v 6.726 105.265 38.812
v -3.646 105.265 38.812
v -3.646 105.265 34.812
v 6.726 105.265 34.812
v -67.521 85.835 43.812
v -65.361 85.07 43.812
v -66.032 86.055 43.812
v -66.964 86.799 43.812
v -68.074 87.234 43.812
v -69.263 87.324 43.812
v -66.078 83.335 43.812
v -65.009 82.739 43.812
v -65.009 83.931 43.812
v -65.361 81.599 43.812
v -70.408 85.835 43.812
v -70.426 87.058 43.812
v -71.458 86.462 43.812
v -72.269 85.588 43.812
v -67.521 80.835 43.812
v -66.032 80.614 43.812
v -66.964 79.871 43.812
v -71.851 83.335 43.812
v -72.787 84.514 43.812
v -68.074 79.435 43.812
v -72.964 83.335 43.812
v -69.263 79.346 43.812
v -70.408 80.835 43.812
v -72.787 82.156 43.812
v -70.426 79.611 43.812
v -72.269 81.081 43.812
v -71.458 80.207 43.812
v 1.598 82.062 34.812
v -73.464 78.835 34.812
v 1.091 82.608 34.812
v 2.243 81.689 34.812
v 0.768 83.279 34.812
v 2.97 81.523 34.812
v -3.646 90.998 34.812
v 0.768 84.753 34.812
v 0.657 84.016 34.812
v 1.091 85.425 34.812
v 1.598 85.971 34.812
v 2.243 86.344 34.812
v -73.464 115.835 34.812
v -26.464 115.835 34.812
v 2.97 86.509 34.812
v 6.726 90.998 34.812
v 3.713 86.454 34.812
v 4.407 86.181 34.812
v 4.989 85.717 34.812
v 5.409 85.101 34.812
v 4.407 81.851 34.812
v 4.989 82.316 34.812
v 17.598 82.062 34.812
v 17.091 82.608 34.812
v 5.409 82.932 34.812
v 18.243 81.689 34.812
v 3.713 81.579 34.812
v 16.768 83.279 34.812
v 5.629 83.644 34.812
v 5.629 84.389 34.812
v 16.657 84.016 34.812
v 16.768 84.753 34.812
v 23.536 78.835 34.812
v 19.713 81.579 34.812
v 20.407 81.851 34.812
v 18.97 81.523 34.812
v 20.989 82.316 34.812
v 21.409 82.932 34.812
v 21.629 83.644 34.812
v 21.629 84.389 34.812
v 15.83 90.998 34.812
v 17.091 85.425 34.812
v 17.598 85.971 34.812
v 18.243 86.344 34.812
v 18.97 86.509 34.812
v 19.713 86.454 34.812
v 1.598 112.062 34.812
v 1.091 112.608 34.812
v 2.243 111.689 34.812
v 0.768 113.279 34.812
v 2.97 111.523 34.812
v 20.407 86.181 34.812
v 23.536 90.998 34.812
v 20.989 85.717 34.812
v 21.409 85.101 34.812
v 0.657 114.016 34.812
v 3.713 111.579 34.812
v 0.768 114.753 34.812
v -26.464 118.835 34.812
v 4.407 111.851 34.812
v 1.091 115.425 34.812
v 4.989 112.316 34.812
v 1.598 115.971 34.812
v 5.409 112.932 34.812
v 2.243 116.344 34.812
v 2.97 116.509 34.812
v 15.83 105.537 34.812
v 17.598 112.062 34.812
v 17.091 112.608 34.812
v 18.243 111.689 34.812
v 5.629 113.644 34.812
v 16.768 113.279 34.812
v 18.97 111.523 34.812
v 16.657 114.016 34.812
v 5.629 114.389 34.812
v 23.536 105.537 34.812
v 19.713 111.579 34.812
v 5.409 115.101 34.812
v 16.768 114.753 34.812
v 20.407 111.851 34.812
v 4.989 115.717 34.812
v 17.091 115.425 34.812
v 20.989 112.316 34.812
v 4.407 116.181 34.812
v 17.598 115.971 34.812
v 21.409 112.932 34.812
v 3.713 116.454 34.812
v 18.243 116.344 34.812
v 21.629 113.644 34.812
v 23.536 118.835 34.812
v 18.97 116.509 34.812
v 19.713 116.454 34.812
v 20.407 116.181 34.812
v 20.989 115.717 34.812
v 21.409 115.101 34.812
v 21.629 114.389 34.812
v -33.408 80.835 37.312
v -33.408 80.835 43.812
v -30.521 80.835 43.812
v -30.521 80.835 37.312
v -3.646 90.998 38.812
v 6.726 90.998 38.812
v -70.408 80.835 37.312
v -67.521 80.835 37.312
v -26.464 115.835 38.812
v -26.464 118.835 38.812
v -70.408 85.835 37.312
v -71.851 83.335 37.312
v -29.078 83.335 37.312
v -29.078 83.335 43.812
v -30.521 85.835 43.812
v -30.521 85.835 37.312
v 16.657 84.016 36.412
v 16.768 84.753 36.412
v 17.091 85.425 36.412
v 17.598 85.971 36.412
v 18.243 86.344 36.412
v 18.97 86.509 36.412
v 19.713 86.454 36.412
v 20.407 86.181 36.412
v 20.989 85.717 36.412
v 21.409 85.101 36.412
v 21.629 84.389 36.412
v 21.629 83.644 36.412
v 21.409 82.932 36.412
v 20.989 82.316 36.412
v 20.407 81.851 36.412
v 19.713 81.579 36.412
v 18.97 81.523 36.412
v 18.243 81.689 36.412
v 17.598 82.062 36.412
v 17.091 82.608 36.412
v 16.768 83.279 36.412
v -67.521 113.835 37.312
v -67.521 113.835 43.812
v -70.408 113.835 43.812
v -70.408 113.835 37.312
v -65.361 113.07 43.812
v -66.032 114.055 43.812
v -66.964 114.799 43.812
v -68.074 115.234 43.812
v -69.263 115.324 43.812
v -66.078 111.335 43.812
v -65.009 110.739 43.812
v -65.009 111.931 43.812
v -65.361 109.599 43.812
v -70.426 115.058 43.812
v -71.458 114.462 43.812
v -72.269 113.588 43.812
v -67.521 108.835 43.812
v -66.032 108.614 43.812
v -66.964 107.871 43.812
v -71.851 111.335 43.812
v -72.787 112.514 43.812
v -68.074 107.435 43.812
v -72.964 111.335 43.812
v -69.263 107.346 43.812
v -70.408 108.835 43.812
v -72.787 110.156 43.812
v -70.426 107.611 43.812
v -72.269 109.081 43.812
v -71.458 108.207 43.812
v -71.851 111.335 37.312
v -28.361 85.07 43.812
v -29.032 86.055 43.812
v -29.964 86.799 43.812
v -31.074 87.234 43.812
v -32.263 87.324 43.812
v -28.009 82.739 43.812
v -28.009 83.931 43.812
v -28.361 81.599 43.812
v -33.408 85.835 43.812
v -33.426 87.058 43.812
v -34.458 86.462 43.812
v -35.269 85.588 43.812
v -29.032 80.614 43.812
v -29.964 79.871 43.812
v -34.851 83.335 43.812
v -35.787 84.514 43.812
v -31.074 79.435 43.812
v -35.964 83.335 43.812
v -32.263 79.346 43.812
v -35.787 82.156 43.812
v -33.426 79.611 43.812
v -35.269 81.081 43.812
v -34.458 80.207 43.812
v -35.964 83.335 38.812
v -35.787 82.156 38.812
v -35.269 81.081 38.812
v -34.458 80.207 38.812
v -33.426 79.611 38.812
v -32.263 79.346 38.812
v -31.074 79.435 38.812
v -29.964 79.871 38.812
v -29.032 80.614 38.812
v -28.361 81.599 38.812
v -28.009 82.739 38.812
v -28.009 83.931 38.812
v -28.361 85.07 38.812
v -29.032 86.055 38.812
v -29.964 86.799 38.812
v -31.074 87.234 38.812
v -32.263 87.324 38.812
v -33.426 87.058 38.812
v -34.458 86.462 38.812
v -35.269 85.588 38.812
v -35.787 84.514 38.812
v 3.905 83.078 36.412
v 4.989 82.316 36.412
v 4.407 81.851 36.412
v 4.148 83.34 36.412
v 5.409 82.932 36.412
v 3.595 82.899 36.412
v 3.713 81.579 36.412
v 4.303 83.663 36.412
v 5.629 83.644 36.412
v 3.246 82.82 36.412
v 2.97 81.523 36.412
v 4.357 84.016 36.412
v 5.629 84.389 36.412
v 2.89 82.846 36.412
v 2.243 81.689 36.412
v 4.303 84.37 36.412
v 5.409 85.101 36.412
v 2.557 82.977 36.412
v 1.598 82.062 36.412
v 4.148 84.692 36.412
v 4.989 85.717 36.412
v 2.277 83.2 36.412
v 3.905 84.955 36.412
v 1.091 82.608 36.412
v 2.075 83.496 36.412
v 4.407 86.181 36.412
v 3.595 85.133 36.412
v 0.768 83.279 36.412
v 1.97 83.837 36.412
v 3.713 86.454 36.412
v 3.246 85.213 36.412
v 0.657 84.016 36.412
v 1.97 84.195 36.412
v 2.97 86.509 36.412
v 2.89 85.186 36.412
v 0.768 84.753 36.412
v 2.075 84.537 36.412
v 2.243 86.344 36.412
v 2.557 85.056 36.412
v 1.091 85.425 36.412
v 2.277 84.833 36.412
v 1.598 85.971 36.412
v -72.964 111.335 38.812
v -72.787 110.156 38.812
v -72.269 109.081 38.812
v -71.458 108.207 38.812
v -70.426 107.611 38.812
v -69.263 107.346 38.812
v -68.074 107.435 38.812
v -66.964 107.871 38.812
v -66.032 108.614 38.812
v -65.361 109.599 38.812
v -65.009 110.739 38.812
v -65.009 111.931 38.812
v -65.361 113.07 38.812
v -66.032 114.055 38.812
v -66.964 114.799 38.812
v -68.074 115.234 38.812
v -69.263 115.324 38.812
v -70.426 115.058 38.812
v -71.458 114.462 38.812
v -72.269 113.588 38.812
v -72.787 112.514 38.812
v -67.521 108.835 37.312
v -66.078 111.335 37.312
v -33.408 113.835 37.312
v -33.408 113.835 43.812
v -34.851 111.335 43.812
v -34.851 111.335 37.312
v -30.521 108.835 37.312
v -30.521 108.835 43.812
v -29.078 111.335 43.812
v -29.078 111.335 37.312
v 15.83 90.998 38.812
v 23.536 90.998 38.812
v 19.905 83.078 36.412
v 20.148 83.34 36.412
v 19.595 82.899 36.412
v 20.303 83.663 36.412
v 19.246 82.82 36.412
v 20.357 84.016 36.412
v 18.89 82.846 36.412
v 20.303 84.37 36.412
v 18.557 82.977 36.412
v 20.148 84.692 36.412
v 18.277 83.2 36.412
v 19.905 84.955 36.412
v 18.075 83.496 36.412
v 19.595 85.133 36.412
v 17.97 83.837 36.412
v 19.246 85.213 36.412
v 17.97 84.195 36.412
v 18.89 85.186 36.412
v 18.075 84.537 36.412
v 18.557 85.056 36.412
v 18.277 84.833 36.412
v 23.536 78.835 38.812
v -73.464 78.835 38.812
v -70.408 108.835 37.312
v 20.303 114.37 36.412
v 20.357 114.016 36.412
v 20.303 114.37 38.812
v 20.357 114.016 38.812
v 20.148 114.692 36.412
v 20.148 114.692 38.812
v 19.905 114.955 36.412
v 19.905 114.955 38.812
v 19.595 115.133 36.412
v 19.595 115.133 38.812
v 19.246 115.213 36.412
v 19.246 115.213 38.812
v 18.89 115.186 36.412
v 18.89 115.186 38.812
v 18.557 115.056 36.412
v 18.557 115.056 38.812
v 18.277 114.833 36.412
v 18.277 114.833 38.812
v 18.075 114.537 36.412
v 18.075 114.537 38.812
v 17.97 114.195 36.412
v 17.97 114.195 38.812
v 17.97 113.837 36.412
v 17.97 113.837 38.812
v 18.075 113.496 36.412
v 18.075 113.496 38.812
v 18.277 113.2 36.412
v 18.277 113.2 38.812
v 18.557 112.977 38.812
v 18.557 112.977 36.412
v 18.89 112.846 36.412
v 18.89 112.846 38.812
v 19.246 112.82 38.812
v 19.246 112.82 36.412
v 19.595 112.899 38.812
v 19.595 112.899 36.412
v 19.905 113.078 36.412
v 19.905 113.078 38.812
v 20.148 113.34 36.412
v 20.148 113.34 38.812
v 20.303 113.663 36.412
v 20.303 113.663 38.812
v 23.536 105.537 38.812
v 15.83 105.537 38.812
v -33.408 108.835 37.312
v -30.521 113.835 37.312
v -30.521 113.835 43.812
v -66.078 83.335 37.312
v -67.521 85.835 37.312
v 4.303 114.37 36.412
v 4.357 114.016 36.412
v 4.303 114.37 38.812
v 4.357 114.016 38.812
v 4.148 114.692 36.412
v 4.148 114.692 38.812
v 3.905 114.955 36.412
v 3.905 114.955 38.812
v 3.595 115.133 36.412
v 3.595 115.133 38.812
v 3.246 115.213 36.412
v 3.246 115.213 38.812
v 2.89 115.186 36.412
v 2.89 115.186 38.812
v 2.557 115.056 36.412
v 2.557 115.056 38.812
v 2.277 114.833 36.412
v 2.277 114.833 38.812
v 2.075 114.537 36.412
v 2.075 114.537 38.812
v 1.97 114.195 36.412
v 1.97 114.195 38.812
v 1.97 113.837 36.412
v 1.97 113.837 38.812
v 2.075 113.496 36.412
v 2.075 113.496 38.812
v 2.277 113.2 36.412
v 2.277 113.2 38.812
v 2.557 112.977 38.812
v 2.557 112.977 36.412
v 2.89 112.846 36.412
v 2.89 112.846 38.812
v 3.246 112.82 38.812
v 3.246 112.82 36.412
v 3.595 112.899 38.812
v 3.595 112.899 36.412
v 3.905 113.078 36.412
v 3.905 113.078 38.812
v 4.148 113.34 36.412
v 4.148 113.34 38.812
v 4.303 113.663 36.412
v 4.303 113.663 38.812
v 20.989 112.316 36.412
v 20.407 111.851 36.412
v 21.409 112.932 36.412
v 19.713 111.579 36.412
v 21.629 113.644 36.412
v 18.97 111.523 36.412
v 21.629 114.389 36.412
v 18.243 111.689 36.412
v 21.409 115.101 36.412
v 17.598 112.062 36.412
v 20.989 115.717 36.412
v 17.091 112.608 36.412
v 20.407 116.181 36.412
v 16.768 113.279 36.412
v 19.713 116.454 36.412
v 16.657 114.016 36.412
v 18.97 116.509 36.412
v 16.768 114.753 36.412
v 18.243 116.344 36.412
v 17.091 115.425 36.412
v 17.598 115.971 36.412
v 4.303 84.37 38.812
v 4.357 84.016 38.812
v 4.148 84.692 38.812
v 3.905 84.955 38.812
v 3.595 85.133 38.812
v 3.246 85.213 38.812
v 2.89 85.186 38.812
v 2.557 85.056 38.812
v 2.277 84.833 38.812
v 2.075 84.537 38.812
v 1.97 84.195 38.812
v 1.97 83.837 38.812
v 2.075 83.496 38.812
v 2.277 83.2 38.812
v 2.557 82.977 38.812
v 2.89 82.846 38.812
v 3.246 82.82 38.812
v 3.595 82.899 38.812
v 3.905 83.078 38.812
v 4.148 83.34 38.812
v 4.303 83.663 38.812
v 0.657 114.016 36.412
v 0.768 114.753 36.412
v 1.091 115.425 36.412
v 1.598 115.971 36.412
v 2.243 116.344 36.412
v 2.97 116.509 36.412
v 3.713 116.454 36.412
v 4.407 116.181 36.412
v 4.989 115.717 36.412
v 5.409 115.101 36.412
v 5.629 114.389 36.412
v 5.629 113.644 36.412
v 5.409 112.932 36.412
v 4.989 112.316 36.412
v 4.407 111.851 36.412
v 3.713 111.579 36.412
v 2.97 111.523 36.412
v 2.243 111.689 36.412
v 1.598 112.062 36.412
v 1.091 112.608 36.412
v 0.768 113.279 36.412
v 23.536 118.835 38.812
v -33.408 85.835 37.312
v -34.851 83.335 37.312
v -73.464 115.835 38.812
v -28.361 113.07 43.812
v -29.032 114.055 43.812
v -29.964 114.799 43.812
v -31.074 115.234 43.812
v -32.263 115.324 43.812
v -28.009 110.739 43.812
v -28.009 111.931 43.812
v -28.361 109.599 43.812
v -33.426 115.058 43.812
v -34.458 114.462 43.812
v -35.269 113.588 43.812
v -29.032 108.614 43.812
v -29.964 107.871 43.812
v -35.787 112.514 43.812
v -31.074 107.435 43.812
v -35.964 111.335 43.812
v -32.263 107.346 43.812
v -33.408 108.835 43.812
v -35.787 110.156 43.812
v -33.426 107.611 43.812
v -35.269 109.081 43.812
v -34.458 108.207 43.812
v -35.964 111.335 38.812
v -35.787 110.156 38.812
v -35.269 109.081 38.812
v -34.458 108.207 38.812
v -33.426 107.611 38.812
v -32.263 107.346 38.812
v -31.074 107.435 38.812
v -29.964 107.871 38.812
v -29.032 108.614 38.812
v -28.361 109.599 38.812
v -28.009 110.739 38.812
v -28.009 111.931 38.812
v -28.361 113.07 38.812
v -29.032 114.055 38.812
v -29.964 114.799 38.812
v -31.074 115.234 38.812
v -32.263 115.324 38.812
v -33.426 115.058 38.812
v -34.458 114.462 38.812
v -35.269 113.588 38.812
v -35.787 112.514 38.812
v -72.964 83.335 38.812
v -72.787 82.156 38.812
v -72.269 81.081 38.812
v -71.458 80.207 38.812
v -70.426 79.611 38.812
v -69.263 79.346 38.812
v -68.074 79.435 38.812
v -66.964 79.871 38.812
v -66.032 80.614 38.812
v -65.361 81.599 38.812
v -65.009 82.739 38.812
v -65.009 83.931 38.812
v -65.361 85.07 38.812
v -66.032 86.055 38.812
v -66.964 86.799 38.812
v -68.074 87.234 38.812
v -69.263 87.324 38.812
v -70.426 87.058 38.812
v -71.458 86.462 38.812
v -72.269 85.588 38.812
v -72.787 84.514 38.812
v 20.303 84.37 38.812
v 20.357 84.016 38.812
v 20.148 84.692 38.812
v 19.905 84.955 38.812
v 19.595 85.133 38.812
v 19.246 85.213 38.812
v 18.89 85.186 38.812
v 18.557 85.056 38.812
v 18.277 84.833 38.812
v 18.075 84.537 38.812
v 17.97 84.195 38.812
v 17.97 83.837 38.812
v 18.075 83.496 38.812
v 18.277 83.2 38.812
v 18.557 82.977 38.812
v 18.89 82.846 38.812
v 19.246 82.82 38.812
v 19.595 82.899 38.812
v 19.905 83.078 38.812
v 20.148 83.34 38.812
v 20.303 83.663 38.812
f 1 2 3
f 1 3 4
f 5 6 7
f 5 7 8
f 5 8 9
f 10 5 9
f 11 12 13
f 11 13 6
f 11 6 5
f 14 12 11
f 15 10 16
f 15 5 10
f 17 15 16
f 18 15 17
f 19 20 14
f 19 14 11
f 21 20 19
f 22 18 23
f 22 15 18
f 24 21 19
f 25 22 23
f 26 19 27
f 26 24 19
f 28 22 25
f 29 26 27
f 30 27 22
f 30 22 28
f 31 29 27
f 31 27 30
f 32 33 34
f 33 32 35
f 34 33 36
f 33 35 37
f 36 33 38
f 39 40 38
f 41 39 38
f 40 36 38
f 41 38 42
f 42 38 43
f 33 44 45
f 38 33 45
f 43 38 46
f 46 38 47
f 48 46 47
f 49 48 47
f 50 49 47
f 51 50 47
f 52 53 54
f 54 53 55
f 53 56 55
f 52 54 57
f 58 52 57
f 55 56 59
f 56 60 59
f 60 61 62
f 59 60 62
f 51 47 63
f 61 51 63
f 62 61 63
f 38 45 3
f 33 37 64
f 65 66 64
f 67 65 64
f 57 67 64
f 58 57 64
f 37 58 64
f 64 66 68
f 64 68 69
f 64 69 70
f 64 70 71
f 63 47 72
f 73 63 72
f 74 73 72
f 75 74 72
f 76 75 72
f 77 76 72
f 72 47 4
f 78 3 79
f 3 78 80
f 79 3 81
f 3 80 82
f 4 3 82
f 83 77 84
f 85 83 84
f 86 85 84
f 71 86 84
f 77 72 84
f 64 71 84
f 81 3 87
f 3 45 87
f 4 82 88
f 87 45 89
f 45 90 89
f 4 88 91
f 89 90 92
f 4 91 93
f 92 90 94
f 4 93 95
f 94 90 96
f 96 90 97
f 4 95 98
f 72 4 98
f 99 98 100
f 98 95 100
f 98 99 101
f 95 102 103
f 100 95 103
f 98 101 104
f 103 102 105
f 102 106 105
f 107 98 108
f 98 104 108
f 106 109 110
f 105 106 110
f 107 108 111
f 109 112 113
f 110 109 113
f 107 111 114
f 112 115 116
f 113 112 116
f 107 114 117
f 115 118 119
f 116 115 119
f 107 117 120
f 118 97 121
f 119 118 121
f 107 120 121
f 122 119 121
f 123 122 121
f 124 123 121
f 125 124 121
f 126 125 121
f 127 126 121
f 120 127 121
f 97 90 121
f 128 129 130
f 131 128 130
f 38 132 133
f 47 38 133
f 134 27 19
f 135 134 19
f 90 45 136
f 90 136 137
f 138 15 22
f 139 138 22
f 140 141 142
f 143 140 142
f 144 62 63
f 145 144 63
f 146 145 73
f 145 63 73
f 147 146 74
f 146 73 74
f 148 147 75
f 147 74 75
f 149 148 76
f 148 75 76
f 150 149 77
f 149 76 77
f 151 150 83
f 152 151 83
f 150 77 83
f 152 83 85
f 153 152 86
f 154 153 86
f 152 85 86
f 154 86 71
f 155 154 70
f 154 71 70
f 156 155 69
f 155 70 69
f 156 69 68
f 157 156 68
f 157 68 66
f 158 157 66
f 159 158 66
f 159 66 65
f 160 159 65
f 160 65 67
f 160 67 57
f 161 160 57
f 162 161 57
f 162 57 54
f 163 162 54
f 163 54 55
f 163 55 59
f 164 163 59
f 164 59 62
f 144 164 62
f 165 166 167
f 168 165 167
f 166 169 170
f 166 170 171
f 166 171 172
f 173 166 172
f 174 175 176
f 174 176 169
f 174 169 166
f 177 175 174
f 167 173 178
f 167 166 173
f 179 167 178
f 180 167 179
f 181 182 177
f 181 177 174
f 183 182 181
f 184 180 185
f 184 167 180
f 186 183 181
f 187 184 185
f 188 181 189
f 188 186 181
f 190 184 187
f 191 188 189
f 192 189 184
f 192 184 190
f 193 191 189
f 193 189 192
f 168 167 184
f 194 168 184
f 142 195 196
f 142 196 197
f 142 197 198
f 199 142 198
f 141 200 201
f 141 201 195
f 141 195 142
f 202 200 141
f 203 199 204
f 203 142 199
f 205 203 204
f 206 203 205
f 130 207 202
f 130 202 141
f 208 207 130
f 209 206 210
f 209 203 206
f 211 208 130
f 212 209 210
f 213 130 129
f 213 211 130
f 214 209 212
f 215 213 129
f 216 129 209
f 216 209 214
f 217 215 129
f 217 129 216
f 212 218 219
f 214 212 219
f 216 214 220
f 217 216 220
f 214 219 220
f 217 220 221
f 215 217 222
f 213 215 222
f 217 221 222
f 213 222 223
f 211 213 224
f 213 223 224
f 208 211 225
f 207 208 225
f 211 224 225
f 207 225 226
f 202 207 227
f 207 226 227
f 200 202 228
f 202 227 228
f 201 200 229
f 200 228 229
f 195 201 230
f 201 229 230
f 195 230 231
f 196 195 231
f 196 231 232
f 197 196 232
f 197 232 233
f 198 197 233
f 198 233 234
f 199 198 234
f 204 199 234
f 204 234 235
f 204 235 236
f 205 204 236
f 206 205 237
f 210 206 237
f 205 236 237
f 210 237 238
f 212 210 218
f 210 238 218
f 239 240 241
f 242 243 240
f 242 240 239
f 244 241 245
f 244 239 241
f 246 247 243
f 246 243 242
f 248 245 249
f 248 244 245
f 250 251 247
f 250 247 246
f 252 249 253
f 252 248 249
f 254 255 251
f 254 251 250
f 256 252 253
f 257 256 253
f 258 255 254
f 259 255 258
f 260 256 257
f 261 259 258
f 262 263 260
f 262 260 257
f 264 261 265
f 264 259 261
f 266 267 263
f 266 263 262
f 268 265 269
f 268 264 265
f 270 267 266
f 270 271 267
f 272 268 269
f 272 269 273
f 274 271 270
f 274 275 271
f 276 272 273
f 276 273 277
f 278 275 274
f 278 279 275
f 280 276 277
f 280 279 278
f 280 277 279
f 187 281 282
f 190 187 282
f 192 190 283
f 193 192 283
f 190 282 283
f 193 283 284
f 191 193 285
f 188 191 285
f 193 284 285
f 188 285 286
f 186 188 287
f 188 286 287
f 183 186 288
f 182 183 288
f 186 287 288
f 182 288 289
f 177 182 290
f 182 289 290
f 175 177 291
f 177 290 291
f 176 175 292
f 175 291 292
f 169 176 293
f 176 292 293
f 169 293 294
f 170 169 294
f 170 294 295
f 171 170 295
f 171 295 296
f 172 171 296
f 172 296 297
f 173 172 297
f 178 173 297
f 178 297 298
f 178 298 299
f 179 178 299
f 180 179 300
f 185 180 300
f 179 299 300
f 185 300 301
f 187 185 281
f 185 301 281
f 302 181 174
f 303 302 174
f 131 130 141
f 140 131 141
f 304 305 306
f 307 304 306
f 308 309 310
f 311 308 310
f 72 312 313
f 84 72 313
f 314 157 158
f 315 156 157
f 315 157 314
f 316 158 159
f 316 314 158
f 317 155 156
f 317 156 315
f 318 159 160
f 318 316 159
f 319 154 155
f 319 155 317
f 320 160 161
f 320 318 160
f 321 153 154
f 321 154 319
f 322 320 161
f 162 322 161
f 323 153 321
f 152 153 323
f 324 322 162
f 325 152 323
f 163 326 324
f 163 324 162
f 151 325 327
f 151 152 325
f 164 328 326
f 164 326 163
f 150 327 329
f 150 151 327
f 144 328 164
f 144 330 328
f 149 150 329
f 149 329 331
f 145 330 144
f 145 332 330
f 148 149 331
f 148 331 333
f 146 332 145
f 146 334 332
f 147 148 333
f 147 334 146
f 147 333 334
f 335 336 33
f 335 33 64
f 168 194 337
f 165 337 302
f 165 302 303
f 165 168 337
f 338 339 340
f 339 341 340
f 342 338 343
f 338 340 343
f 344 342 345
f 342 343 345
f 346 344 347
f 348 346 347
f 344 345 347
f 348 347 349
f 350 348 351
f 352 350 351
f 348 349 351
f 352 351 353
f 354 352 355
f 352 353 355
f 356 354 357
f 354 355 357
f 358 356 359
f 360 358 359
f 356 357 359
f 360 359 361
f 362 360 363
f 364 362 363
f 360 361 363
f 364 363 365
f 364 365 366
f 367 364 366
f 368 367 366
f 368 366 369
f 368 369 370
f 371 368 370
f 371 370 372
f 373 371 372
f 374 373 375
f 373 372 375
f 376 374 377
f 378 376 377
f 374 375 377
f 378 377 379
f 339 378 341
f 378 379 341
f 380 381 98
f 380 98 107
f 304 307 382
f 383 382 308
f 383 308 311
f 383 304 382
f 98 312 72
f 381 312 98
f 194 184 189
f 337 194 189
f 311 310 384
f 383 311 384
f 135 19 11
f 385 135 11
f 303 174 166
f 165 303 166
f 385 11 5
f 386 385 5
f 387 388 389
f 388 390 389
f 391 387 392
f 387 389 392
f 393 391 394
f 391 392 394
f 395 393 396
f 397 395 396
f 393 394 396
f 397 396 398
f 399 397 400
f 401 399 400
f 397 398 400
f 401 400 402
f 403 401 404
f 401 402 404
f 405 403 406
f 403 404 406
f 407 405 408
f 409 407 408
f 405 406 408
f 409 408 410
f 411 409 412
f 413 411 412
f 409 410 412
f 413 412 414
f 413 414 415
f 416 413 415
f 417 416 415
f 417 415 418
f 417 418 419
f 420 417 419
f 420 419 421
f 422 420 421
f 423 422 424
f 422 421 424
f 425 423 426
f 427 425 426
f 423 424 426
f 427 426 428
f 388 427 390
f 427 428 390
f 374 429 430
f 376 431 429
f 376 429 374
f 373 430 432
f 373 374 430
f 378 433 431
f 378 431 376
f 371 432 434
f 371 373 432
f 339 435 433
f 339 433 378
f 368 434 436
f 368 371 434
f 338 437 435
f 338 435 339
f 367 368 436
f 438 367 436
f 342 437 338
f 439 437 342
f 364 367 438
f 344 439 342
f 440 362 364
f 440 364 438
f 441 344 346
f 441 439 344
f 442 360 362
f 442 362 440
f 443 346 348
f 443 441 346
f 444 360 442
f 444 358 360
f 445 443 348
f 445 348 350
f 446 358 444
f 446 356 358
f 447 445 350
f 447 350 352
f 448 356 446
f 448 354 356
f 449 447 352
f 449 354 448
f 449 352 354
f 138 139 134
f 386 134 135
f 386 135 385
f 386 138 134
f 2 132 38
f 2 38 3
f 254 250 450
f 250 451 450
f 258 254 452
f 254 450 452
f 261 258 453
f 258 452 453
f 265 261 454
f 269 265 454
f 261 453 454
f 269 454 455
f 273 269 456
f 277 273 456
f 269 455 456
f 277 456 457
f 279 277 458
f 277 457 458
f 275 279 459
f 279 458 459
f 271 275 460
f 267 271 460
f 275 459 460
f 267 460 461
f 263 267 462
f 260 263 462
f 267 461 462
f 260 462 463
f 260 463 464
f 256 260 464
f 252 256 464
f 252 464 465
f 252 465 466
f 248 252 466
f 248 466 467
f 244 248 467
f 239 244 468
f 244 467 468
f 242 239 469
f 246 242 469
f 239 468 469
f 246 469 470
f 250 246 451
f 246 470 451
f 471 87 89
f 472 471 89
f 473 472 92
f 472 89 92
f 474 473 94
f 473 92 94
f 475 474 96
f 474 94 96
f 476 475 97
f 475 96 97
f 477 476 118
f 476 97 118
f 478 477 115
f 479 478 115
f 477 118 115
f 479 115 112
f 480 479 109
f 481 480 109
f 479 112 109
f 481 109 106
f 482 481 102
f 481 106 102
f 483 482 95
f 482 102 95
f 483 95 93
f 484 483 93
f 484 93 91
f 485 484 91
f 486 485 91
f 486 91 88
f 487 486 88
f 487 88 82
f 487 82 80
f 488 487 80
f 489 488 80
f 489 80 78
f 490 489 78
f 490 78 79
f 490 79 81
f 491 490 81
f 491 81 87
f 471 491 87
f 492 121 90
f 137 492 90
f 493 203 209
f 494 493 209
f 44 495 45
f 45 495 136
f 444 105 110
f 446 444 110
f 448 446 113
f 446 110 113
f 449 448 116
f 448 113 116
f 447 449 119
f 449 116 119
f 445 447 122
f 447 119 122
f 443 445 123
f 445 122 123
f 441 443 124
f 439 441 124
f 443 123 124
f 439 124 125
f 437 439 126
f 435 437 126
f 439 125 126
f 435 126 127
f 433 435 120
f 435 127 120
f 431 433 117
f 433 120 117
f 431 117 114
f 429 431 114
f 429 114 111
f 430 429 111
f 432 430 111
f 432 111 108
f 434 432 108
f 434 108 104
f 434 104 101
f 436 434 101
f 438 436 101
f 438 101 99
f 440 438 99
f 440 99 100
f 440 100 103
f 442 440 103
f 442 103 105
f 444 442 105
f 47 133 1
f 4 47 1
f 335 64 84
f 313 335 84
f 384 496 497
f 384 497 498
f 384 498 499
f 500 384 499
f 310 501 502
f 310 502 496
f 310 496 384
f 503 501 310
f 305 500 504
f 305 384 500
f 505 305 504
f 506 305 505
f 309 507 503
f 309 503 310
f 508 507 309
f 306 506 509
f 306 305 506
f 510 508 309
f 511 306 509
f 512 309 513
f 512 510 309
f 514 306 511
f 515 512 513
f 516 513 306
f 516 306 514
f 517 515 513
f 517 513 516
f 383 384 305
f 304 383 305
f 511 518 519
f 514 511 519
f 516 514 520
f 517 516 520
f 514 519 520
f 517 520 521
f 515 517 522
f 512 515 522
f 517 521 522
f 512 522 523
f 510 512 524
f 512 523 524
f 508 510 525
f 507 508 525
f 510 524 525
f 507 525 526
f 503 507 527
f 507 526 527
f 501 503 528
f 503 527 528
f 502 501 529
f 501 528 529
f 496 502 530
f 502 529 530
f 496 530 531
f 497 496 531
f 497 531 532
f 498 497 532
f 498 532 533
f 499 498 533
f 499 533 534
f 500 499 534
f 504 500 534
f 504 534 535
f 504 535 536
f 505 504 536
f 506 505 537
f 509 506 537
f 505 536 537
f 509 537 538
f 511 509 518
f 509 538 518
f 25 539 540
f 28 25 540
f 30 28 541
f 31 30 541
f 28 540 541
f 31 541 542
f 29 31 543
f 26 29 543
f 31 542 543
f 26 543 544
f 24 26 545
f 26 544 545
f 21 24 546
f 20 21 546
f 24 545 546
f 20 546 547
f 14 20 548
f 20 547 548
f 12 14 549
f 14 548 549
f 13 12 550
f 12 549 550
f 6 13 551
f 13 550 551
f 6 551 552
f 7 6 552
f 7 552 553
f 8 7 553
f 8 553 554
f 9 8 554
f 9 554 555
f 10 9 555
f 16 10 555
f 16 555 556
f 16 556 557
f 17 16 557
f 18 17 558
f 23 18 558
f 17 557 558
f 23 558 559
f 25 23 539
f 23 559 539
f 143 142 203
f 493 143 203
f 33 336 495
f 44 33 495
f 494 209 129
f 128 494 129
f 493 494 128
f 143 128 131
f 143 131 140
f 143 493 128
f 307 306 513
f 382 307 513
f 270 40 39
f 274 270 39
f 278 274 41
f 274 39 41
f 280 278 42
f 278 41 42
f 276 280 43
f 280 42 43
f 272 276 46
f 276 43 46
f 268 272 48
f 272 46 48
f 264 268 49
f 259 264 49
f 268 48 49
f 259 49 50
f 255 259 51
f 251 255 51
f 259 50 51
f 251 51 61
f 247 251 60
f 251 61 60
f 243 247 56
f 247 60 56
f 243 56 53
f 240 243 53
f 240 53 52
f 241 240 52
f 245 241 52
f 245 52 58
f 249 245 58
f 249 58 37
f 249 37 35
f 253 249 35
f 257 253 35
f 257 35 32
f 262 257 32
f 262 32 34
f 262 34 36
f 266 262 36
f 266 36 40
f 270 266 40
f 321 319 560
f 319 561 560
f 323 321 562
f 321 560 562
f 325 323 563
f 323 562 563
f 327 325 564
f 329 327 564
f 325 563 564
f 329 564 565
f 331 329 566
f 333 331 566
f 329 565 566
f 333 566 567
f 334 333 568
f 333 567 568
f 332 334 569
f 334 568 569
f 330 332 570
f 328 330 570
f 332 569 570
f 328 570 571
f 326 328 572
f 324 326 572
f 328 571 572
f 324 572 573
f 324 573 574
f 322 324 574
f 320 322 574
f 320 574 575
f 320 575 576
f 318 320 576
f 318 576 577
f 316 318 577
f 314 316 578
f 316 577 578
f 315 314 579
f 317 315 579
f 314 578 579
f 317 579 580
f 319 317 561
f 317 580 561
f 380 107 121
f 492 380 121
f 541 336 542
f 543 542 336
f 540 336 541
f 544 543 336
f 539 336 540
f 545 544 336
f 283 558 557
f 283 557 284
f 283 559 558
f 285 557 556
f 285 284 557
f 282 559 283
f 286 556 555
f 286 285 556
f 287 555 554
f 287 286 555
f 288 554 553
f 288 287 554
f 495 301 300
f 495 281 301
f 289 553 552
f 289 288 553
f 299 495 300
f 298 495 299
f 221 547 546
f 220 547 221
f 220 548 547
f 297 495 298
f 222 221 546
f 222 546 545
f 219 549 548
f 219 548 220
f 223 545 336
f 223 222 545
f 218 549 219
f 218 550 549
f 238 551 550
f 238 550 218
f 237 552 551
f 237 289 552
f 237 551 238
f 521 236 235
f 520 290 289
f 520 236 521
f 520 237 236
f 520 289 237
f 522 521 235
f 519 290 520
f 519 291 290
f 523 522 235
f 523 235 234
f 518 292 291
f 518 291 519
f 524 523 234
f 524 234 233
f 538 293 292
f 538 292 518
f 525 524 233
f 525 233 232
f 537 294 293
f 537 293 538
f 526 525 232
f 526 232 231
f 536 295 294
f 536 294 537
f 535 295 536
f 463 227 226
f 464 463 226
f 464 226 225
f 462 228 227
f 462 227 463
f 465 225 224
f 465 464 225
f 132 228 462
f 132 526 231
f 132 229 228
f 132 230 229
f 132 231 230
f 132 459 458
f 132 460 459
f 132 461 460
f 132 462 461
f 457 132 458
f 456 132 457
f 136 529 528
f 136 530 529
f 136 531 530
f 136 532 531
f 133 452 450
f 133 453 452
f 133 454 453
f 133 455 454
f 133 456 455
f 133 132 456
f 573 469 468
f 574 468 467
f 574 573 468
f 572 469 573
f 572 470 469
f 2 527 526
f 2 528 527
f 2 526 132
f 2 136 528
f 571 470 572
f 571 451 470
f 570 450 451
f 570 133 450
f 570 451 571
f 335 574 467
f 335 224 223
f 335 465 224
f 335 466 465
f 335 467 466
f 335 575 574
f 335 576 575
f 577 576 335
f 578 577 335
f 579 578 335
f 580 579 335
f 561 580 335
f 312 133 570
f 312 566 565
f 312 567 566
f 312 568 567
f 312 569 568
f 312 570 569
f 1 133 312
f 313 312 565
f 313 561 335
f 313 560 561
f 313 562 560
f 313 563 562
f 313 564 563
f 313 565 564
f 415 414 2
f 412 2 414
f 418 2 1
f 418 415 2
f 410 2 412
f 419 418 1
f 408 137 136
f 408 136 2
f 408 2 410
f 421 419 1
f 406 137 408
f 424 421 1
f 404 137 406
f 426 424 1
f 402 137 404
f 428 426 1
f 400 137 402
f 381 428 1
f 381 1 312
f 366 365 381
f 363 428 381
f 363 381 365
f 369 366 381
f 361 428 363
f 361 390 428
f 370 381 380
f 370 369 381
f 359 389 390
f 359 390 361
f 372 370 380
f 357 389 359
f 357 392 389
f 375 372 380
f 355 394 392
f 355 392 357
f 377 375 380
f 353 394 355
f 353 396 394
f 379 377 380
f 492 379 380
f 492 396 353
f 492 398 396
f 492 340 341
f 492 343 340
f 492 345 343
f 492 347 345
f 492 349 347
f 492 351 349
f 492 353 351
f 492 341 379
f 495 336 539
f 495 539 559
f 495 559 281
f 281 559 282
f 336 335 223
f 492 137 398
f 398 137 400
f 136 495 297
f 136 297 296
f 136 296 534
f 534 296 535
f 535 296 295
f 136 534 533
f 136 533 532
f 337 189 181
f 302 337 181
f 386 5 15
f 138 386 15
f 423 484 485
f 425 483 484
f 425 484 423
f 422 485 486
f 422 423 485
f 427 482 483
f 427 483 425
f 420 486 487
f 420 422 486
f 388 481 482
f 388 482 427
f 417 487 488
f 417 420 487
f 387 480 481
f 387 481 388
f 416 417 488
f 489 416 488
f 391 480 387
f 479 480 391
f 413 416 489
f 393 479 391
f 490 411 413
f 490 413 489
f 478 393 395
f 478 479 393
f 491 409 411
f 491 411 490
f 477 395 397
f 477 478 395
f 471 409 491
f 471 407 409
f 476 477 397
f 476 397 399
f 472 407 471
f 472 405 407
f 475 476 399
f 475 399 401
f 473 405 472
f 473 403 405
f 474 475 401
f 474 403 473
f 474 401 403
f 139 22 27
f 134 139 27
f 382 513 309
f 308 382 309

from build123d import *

# Parameters (mm, degrees)
SKETCH1_W                                        = 50
SKETCH1_H                                        = 40
BOSS_EXTRUDE1_DEPTH                              = 4
SKETCH2_W                                        = 7.705962758
SKETCH2_H                                        = 14.539090136
CUT_EXTRUDE1_DEPTH                               = 122.811546491
SKETCH3_W                                        = 10.372123492
SKETCH3_H                                        = 14.267331442
CUT_EXTRUDE2_DEPTH                               = 122.811546491
CBORE_FOR_M2_PAN_HEAD_MACHINE_SCREW1_D           = 2.4
CBORE_FOR_M2_PAN_HEAD_MACHINE_SCREW1_CBORE_D     = 5
CBORE_FOR_M2_PAN_HEAD_MACHINE_SCREW1_CBORE_DEPTH = 1.6
SKETCH6_W                                        = 47
SKETCH6_H                                        = 37
BOSS_EXTRUDE2_DEPTH                              = 4
SKETCH7_R                                        = 4
BOSS_EXTRUDE3_DEPTH                              = 5
F_2_7_2_7_DIAMETER_HOLE1_D                       = 2.7
F_2_7_2_7_DIAMETER_HOLE1_DEPTH                   = 4
F_2_7_2_7_DIAMETER_HOLE1_TIP                     = 0.811161836
CUT_EXTRUDE3_DEPTH                               = 6.5


with BuildPart() as part:
    # Sketch1 → Boss-Extrude1 (new body)
    with BuildSketch(Plane(origin=(0, 0, 34.811611197), x_dir=(-1, 0, 0), z_dir=(0, 0, -1))):
        with Locations((1.46446617, 98.834695645)):
            Rectangle(SKETCH1_W, SKETCH1_H)
    extrude(amount=-BOSS_EXTRUDE1_DEPTH)

    # Sketch2 → Cut-Extrude1 (cut, through all)
    with BuildSketch(Plane.XY.offset(38.811611197)):
        with Locations((19.682552451, 98.267628733)):
            Rectangle(SKETCH2_W, SKETCH2_H)
    extrude(amount=-CUT_EXTRUDE1_DEPTH, mode=Mode.SUBTRACT)

    # Sketch3 → Cut-Extrude2 (cut, through all)
    with BuildSketch(Plane.XY.offset(38.811611197)):
        with Locations((1.539593072, 98.131749386)):
            Rectangle(SKETCH3_W, SKETCH3_H)
    extrude(amount=-CUT_EXTRUDE2_DEPTH, mode=Mode.SUBTRACT)

    # CBORE for M2 Pan Head Machine Screw1 (through all)
    with Locations(Plane(origin=(0, 0, 34.811611197), x_dir=(-1, 0, 0), z_dir=(0, 0, -1))):
        with Locations((-3.156646479, 84.016340669), (-19.156646479, 84.016340669), (-19.156646479, 114.016340669), (-3.156646479, 114.016340669)):
            CounterBoreHole(CBORE_FOR_M2_PAN_HEAD_MACHINE_SCREW1_D / 2, CBORE_FOR_M2_PAN_HEAD_MACHINE_SCREW1_CBORE_D / 2, CBORE_FOR_M2_PAN_HEAD_MACHINE_SCREW1_CBORE_DEPTH)

    # Sketch6 → Boss-Extrude2 (add)
    with BuildSketch(Plane.XY.offset(38.811611197)):
        with Locations((-49.96446617, 97.334695645)):
            Rectangle(SKETCH6_W, SKETCH6_H)
    extrude(amount=-BOSS_EXTRUDE2_DEPTH)

    # Sketch7 → Boss-Extrude3 (add)
    with BuildSketch(Plane.XY.offset(38.811611197)):
        with Locations(Location((-68.96446617, 111.334695645, 0), (0, 0, 180))):
            Circle(SKETCH7_R)
        with Locations(Location((-31.96446617, 111.334695645, 0), (0, 0, 180))):
            Circle(SKETCH7_R)
        with Locations(Location((-68.96446617, 83.334695645, 0), (0, 0, 180))):
            Circle(SKETCH7_R)
        with Locations(Location((-31.96446617, 83.334695645, 0), (0, 0, 180))):
            Circle(SKETCH7_R)
    extrude(amount=BOSS_EXTRUDE3_DEPTH)

    # Ø2.7 (2.7) Diameter Hole1
    with Locations(Plane.XY.offset(43.811611197)):
        with Locations((-68.96446617, 111.334695645), (-31.96446617, 111.334695645), (-31.96446617, 83.334695645), (-68.96446617, 83.334695645)):
            Hole(F_2_7_2_7_DIAMETER_HOLE1_D / 2, depth=F_2_7_2_7_DIAMETER_HOLE1_DEPTH)
            with Locations((0, 0, -(F_2_7_2_7_DIAMETER_HOLE1_DEPTH + F_2_7_2_7_DIAMETER_HOLE1_TIP / 2))):  # 118° drill point
                Cone(0, F_2_7_2_7_DIAMETER_HOLE1_D / 2, F_2_7_2_7_DIAMETER_HOLE1_TIP, mode=Mode.SUBTRACT)

    # Sketch10 → Cut-Extrude3 (cut)
    with BuildSketch(Plane.XY.offset(43.811611197)):
        Polygon((-67.521090497, 113.834695645), (-70.407841843, 113.834695645), (-71.851217516, 111.334695645), (-70.407841843, 108.834695645), (-67.521090497, 108.834695645), (-66.077714824, 111.334695645), align=None)
        Polygon((-67.521090497, 85.834695645), (-70.407841843, 85.834695645), (-71.851217516, 83.334695645), (-70.407841843, 80.834695645), (-67.521090497, 80.834695645), (-66.077714824, 83.334695645), align=None)
        Polygon((-30.521090497, 113.834695645), (-33.407841843, 113.834695645), (-34.851217516, 111.334695645), (-33.407841843, 108.834695645), (-30.521090497, 108.834695645), (-29.077714824, 111.334695645), align=None)
        Polygon((-30.521090497, 85.834695645), (-33.407841843, 85.834695645), (-34.851217516, 83.334695645), (-33.407841843, 80.834695645), (-30.521090497, 80.834695645), (-29.077714824, 83.334695645), align=None)
    extrude(amount=-CUT_EXTRUDE3_DEPTH, mode=Mode.SUBTRACT)


solid = part.part
